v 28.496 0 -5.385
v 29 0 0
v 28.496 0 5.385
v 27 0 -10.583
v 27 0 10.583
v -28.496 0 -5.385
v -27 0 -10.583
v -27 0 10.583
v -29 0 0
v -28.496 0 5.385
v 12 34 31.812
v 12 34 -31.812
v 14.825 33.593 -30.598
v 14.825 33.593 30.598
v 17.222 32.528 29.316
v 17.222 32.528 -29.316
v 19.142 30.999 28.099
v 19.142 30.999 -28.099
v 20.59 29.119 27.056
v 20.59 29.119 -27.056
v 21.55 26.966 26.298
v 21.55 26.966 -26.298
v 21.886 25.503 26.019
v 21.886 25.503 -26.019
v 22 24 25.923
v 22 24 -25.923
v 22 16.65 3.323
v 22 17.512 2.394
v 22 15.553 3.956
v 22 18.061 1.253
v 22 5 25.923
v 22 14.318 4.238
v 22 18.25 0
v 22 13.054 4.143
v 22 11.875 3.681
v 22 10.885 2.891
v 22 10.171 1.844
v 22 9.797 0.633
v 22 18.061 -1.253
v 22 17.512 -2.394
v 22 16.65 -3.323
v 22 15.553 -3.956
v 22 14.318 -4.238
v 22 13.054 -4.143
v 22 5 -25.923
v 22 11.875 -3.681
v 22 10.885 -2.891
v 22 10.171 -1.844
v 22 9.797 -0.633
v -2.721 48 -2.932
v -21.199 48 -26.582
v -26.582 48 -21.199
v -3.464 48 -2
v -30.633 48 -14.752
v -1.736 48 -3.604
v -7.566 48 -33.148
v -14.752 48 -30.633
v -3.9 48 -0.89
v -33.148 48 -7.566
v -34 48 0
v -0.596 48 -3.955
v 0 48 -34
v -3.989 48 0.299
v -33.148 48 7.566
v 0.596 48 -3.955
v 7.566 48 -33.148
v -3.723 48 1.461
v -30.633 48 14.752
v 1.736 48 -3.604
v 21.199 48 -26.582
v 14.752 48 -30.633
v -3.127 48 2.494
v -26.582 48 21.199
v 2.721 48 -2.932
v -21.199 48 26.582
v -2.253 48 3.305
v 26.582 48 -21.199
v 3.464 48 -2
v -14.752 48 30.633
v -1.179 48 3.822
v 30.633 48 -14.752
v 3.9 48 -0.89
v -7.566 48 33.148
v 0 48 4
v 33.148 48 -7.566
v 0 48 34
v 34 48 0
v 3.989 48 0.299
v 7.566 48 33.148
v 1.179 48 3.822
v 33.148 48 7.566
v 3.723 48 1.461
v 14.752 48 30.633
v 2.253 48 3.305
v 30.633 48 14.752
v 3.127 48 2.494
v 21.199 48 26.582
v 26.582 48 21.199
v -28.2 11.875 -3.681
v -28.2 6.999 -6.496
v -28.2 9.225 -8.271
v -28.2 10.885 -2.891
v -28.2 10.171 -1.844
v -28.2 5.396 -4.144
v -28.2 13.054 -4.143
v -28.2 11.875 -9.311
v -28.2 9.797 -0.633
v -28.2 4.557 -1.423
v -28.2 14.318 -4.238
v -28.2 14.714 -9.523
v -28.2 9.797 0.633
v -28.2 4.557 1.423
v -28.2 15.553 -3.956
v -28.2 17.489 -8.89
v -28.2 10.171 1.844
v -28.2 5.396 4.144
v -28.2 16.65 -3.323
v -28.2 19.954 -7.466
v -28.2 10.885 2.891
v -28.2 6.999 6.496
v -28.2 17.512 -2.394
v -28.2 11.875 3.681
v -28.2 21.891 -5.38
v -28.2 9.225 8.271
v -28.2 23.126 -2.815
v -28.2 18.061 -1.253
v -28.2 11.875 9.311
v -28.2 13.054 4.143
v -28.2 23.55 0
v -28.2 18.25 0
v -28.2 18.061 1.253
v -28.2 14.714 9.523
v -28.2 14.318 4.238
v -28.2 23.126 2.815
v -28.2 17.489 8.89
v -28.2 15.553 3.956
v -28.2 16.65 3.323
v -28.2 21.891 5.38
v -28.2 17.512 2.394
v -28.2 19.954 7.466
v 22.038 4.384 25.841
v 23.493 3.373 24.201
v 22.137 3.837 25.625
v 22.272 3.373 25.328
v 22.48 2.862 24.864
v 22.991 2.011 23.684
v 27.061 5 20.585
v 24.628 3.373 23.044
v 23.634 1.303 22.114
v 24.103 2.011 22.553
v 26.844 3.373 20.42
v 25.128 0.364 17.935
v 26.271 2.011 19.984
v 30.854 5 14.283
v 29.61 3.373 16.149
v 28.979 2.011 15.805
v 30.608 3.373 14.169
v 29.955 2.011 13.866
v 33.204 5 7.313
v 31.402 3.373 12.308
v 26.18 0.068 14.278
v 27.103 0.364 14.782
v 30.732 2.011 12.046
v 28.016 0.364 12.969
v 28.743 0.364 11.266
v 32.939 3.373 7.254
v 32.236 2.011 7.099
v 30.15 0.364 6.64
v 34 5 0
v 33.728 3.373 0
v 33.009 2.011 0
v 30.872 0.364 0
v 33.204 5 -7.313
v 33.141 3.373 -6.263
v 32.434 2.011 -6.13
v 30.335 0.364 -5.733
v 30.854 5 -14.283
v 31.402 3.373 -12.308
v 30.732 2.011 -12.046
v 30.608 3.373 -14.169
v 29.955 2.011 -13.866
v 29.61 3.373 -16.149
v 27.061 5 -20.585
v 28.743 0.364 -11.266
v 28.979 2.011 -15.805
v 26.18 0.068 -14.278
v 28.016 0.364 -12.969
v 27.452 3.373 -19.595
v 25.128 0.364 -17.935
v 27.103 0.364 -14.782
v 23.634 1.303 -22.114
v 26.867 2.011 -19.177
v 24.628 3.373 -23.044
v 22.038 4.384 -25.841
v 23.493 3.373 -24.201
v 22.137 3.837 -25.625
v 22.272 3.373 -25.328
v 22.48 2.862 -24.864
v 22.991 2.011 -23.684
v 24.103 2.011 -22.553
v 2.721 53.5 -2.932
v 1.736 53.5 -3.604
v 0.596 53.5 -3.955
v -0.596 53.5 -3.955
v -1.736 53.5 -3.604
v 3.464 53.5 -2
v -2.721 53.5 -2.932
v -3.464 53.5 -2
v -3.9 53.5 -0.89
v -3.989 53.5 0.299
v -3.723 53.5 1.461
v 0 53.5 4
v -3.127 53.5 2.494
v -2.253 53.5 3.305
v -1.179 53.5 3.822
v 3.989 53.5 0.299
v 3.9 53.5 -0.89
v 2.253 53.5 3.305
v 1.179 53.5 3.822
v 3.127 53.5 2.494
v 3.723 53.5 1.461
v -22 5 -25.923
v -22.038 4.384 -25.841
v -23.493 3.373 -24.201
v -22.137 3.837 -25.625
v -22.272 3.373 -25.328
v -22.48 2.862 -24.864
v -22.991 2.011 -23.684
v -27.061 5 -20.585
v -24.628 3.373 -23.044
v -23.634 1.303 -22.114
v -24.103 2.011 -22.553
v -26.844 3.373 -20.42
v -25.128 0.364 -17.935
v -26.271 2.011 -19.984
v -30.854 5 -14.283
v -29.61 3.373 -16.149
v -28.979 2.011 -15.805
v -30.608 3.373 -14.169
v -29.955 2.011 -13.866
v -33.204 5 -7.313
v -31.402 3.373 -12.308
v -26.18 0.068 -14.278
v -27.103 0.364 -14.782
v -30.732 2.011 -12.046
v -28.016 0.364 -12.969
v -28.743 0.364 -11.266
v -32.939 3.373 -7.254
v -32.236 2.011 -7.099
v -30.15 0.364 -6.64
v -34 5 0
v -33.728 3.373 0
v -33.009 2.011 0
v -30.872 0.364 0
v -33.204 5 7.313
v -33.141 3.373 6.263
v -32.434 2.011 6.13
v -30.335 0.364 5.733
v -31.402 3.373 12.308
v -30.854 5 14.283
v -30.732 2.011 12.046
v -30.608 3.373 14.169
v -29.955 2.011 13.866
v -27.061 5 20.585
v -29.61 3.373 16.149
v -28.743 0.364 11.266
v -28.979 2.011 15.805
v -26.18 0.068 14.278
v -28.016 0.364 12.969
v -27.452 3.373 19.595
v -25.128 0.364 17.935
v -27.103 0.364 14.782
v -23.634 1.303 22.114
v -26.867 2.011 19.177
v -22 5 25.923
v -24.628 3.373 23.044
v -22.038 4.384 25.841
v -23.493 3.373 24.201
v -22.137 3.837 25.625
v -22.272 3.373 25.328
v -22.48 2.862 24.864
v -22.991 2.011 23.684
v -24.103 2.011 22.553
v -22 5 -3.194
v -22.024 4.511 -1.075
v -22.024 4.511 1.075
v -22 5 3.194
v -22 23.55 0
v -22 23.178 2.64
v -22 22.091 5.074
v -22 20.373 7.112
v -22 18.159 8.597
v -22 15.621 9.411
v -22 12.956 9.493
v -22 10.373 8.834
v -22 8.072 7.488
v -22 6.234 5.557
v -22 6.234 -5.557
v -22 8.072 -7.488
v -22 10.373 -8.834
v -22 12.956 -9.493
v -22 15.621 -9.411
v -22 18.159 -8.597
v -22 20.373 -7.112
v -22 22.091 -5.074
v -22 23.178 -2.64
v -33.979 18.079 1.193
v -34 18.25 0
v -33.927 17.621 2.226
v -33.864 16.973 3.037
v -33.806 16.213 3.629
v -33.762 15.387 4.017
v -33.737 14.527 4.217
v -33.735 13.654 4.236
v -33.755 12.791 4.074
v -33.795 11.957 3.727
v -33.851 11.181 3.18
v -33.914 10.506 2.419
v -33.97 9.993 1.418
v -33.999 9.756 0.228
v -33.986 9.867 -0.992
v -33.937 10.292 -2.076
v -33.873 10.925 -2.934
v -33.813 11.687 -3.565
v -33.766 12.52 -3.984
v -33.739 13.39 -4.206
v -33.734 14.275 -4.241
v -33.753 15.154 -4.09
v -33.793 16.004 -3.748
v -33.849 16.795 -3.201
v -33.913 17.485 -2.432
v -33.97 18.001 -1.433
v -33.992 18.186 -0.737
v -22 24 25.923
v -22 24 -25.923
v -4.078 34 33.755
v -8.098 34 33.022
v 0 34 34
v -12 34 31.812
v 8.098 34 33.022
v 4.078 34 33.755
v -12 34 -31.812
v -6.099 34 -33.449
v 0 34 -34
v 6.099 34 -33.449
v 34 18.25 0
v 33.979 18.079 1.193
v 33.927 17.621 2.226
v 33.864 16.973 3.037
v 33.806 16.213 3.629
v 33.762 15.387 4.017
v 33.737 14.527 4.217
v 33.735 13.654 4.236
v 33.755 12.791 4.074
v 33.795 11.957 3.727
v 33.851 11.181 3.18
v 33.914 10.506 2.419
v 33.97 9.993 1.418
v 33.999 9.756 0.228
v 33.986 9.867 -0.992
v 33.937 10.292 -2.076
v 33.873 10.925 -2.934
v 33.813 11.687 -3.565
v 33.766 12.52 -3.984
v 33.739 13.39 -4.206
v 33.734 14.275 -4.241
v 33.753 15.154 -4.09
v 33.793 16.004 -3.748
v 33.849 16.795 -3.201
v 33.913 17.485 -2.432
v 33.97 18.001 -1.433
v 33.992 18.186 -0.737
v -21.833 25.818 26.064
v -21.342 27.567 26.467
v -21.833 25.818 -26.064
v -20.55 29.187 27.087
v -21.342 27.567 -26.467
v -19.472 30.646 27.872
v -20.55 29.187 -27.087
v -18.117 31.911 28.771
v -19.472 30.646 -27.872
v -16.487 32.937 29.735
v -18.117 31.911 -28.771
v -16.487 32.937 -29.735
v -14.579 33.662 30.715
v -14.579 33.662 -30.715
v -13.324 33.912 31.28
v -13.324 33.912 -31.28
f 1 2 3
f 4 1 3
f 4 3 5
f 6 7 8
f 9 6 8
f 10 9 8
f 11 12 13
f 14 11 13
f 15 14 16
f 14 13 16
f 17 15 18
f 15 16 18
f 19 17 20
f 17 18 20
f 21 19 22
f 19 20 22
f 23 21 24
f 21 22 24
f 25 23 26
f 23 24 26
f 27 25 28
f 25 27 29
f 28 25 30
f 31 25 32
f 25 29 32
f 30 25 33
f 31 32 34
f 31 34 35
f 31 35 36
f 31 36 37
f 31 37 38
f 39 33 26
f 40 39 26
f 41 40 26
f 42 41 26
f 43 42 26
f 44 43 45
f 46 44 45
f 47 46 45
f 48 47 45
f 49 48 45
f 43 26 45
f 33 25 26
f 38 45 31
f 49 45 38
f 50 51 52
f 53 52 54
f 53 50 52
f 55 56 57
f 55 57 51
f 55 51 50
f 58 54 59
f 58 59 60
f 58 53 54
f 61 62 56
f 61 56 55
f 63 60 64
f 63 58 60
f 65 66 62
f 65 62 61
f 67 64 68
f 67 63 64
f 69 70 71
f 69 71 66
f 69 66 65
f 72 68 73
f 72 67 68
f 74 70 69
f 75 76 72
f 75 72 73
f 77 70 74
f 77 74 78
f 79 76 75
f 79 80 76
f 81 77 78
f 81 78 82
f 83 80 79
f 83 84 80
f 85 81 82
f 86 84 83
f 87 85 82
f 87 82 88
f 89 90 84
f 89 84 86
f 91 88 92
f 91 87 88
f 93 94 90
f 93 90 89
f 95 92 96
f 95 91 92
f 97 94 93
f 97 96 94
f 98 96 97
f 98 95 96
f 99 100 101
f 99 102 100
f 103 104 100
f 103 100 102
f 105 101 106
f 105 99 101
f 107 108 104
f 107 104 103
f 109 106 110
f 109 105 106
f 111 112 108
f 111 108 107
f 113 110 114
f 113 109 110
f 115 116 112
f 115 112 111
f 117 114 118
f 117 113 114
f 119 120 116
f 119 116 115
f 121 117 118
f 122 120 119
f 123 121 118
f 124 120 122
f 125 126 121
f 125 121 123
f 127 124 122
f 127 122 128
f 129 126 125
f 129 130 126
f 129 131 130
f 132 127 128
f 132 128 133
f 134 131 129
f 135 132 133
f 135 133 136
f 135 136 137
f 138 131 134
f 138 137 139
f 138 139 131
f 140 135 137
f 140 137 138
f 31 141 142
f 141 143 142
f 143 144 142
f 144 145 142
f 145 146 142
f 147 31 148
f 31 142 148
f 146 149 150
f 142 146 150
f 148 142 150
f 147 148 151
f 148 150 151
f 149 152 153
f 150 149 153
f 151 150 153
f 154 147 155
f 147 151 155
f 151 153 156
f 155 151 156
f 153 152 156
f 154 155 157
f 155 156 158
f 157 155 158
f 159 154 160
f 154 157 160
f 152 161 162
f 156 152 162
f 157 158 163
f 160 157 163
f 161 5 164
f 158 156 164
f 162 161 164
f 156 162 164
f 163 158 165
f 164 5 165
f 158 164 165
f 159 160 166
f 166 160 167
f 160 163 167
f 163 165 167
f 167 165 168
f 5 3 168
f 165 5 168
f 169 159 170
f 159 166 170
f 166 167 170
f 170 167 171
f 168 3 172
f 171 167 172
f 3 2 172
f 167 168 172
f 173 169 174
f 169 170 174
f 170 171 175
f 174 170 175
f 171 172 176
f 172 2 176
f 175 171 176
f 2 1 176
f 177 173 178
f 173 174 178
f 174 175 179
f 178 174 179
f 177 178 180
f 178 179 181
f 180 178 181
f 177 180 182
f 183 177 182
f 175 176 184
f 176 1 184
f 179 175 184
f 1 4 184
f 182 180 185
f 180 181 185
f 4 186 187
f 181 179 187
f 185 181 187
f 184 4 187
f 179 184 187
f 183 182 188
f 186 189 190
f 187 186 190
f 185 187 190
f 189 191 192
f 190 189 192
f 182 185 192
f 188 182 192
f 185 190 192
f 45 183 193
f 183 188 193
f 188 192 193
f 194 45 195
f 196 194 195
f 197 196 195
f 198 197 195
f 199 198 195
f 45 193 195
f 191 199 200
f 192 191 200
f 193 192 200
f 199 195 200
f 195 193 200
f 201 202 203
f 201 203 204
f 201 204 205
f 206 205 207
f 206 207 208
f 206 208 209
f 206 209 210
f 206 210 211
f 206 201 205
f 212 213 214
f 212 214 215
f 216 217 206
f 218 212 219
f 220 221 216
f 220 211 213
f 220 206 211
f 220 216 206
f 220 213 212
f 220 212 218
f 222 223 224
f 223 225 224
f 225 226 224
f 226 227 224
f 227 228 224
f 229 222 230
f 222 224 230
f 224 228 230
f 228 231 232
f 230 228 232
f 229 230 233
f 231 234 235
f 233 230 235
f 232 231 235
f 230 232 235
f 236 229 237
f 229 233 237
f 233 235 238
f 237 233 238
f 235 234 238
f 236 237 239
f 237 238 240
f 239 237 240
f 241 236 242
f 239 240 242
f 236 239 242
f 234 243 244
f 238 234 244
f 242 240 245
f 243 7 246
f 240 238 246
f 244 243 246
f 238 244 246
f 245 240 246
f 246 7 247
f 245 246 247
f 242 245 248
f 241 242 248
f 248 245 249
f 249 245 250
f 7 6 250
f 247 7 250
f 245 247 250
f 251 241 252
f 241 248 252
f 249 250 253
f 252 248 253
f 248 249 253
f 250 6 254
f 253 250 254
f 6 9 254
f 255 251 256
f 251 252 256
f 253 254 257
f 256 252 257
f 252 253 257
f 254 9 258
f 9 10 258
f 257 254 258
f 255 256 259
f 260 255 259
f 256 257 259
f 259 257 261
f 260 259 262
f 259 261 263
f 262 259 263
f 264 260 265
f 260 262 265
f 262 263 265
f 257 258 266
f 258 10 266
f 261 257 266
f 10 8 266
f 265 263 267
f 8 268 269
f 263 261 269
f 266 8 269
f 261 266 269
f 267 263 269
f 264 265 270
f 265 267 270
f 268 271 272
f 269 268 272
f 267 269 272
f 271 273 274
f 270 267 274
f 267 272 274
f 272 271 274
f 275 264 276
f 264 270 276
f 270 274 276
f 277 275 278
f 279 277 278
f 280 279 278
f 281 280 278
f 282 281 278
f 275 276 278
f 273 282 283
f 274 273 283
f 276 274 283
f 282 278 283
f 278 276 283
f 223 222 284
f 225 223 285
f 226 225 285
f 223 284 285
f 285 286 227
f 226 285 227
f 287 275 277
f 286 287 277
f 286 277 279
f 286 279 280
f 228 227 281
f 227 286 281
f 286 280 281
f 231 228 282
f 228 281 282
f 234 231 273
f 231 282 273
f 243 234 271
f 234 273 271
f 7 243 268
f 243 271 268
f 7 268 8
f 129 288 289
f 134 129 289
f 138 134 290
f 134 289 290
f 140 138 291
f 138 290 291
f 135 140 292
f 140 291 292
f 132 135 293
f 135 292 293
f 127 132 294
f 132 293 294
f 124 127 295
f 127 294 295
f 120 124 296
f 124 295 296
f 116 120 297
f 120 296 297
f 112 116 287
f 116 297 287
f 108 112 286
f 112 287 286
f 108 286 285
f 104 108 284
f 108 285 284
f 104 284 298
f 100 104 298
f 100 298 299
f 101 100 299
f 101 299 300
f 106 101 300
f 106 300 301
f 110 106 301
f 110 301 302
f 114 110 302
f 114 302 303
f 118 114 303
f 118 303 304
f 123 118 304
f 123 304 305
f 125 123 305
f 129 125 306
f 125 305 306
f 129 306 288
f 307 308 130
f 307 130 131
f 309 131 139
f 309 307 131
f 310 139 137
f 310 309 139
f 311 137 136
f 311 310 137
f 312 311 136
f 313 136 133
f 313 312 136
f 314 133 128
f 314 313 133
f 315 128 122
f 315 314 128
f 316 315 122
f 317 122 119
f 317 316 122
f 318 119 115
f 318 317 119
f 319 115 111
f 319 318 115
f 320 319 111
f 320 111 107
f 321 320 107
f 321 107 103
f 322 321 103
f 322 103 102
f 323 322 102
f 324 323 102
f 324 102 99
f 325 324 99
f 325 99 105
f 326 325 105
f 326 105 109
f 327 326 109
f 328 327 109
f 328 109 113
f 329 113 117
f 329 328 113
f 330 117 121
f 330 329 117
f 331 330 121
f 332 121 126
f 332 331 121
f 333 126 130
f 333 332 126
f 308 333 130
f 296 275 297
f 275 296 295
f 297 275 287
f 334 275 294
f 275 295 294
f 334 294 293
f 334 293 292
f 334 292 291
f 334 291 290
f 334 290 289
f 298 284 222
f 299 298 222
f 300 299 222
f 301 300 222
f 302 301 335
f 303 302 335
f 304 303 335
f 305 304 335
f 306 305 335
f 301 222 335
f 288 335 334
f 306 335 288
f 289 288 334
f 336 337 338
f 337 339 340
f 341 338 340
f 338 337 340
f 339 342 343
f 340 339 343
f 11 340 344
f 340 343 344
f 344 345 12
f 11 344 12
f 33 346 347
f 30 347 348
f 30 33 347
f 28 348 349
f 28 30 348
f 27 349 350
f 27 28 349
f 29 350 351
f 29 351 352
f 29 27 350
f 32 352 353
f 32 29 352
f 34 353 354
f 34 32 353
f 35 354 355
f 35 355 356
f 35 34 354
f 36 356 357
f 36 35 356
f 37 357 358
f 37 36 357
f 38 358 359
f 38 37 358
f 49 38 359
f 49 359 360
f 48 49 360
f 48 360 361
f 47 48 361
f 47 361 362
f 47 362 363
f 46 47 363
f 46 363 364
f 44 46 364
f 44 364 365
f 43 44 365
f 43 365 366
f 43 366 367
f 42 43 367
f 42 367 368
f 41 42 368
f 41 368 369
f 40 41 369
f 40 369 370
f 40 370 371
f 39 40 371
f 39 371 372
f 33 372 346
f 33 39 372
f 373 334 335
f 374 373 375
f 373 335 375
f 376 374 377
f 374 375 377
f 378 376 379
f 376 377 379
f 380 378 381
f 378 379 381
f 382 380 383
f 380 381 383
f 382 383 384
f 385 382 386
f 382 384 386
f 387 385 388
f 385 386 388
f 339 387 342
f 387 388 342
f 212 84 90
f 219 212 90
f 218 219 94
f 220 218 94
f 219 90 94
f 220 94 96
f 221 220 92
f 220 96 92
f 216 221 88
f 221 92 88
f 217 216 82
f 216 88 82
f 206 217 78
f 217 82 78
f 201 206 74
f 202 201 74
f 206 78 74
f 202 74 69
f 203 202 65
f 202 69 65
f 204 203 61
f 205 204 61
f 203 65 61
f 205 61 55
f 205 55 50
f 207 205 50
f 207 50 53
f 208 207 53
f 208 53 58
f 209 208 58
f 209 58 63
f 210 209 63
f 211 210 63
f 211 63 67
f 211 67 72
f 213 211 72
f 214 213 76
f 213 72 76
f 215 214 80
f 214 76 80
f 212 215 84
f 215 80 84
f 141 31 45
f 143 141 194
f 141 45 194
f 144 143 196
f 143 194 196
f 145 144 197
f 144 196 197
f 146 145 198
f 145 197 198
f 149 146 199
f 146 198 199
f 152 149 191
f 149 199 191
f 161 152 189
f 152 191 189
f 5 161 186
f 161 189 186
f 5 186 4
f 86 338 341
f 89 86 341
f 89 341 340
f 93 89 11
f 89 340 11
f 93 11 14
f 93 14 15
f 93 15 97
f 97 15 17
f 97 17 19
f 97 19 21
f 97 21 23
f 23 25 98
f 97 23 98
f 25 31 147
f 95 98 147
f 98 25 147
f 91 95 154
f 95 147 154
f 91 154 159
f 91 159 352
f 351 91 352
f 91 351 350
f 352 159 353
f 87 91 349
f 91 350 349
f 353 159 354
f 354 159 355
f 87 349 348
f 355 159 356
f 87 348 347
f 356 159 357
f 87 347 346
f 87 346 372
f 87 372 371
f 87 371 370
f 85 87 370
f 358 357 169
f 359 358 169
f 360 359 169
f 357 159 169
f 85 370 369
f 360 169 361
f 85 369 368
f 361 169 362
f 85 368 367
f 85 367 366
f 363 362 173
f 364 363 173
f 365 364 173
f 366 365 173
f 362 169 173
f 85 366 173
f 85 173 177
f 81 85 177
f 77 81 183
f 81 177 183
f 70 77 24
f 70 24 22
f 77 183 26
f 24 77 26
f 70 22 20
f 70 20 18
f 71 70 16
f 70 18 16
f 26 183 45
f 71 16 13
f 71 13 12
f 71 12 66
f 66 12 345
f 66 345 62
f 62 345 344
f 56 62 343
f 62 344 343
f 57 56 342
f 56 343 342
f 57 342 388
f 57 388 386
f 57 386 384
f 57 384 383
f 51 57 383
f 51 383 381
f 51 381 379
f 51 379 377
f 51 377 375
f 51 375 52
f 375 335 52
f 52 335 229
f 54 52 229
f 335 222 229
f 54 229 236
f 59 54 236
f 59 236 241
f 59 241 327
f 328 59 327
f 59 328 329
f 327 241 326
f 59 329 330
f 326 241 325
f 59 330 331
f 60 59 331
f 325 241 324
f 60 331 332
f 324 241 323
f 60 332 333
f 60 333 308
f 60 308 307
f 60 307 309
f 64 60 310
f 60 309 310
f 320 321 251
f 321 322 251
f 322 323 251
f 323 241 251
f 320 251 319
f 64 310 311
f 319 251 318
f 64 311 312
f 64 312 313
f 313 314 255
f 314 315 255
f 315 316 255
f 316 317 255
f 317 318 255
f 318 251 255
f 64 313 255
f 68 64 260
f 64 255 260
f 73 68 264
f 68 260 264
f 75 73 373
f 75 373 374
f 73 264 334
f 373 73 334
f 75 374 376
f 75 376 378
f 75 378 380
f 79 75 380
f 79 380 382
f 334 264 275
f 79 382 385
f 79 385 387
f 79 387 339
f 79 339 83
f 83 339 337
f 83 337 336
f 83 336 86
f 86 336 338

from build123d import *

# Parameters (mm, degrees)
SKETCH1_R               = 34
BOSS_EXTRUDE1_DEPTH     = 48
CUT_EXTRUDE1_DEPTH      = 68.941151006
CUT_EXTRUDE1_DEPTH_BACK = 68.941151006
FILLET6_R               = 5
CUT_EXTRUDE2_DEPTH      = 82.215762187
CUT_EXTRUDE2_DEPTH_BACK = 82.215762187
SKETCH5_R               = 4.25
SKETCH6_R               = 9.55
CUT_EXTRUDE3_DEPTH      = 6.2
SKETCH7_R               = 4
BOSS_EXTRUDE2_DEPTH     = 5.5


with BuildPart() as part:
    # Sketch1 → Boss-Extrude1 (new body)
    with BuildSketch(Plane(origin=(0, 0, 0), x_dir=(1, 0, 0), z_dir=(0, 1, 0))):
        with Locations(Location((0, 0, 0), (0, 0, 270))):
            Circle(SKETCH1_R)
    extrude(amount=BOSS_EXTRUDE1_DEPTH)

    # Sketch3 → Cut-Extrude1 (cut, two sides: drawn at the far end of the back side and taken through both)
    with BuildSketch(Plane.XY.offset(-CUT_EXTRUDE1_DEPTH_BACK)):
        with BuildLine():
            Line((-22, -157.512711317), (-22, 0))
            Line((-22, 0), (-22, 24))
            ThreePointArc((-22, 24), (-19.071067812, 31.071067812), (-12, 34))
            Line((-12, 34), (12, 34))
            ThreePointArc((12, 34), (19.071067812, 31.071067812), (22, 24))
            Line((22, 24), (22, 0))
            Line((22, 0), (22, -157.512711317))
            Line((22, -157.512711317), (22, -472.53813395))
            Line((22, -472.53813395), (-22, -472.53813395))
            Line((-22, -472.53813395), (-22, -157.512711317))
        make_face()
    extrude(amount=CUT_EXTRUDE1_DEPTH + CUT_EXTRUDE1_DEPTH_BACK, mode=Mode.SUBTRACT)

    # Fillet6
    fillet6_edges = [part.edges().sort_by_distance(p)[0] for p in [
        (34, 0, 0),
        (-34, 0, 0),
        (-22, 0, 0),
        (22, 0, 0),
    ]]
    fillet(fillet6_edges, radius=FILLET6_R)

    # Sketch5 → Cut-Extrude2 (cut, two sides: drawn at the far end of the back side and taken through both)
    with BuildSketch(Plane(origin=(-22, 0, 0), x_dir=(0, 0, -1), z_dir=(1, 0, 0)).offset(-CUT_EXTRUDE2_DEPTH_BACK)):
        with Locations(Location((0, 14, 0), (0, 0, 90))):
            Circle(SKETCH5_R)
    extrude(amount=CUT_EXTRUDE2_DEPTH + CUT_EXTRUDE2_DEPTH_BACK, mode=Mode.SUBTRACT)

    # Sketch6 → Cut-Extrude3 (cut)
    with BuildSketch(Plane(origin=(-22, 0, 0), x_dir=(0, 0, -1), z_dir=(1, 0, 0))):
        with Locations(Location((0, 14, 0), (0, 0, 90))):
            Circle(SKETCH6_R)
    extrude(amount=-CUT_EXTRUDE3_DEPTH, mode=Mode.SUBTRACT)

    # Sketch7 → Boss-Extrude2 (add)
    with BuildSketch(Plane(origin=(0, 48, 0), x_dir=(1, 0, 0), z_dir=(0, 1, 0))):
        with Locations(Location((0, 0, 0), (0, 0, 270))):
            Circle(SKETCH7_R)
    extrude(amount=BOSS_EXTRUDE2_DEPTH)


solid = part.part
